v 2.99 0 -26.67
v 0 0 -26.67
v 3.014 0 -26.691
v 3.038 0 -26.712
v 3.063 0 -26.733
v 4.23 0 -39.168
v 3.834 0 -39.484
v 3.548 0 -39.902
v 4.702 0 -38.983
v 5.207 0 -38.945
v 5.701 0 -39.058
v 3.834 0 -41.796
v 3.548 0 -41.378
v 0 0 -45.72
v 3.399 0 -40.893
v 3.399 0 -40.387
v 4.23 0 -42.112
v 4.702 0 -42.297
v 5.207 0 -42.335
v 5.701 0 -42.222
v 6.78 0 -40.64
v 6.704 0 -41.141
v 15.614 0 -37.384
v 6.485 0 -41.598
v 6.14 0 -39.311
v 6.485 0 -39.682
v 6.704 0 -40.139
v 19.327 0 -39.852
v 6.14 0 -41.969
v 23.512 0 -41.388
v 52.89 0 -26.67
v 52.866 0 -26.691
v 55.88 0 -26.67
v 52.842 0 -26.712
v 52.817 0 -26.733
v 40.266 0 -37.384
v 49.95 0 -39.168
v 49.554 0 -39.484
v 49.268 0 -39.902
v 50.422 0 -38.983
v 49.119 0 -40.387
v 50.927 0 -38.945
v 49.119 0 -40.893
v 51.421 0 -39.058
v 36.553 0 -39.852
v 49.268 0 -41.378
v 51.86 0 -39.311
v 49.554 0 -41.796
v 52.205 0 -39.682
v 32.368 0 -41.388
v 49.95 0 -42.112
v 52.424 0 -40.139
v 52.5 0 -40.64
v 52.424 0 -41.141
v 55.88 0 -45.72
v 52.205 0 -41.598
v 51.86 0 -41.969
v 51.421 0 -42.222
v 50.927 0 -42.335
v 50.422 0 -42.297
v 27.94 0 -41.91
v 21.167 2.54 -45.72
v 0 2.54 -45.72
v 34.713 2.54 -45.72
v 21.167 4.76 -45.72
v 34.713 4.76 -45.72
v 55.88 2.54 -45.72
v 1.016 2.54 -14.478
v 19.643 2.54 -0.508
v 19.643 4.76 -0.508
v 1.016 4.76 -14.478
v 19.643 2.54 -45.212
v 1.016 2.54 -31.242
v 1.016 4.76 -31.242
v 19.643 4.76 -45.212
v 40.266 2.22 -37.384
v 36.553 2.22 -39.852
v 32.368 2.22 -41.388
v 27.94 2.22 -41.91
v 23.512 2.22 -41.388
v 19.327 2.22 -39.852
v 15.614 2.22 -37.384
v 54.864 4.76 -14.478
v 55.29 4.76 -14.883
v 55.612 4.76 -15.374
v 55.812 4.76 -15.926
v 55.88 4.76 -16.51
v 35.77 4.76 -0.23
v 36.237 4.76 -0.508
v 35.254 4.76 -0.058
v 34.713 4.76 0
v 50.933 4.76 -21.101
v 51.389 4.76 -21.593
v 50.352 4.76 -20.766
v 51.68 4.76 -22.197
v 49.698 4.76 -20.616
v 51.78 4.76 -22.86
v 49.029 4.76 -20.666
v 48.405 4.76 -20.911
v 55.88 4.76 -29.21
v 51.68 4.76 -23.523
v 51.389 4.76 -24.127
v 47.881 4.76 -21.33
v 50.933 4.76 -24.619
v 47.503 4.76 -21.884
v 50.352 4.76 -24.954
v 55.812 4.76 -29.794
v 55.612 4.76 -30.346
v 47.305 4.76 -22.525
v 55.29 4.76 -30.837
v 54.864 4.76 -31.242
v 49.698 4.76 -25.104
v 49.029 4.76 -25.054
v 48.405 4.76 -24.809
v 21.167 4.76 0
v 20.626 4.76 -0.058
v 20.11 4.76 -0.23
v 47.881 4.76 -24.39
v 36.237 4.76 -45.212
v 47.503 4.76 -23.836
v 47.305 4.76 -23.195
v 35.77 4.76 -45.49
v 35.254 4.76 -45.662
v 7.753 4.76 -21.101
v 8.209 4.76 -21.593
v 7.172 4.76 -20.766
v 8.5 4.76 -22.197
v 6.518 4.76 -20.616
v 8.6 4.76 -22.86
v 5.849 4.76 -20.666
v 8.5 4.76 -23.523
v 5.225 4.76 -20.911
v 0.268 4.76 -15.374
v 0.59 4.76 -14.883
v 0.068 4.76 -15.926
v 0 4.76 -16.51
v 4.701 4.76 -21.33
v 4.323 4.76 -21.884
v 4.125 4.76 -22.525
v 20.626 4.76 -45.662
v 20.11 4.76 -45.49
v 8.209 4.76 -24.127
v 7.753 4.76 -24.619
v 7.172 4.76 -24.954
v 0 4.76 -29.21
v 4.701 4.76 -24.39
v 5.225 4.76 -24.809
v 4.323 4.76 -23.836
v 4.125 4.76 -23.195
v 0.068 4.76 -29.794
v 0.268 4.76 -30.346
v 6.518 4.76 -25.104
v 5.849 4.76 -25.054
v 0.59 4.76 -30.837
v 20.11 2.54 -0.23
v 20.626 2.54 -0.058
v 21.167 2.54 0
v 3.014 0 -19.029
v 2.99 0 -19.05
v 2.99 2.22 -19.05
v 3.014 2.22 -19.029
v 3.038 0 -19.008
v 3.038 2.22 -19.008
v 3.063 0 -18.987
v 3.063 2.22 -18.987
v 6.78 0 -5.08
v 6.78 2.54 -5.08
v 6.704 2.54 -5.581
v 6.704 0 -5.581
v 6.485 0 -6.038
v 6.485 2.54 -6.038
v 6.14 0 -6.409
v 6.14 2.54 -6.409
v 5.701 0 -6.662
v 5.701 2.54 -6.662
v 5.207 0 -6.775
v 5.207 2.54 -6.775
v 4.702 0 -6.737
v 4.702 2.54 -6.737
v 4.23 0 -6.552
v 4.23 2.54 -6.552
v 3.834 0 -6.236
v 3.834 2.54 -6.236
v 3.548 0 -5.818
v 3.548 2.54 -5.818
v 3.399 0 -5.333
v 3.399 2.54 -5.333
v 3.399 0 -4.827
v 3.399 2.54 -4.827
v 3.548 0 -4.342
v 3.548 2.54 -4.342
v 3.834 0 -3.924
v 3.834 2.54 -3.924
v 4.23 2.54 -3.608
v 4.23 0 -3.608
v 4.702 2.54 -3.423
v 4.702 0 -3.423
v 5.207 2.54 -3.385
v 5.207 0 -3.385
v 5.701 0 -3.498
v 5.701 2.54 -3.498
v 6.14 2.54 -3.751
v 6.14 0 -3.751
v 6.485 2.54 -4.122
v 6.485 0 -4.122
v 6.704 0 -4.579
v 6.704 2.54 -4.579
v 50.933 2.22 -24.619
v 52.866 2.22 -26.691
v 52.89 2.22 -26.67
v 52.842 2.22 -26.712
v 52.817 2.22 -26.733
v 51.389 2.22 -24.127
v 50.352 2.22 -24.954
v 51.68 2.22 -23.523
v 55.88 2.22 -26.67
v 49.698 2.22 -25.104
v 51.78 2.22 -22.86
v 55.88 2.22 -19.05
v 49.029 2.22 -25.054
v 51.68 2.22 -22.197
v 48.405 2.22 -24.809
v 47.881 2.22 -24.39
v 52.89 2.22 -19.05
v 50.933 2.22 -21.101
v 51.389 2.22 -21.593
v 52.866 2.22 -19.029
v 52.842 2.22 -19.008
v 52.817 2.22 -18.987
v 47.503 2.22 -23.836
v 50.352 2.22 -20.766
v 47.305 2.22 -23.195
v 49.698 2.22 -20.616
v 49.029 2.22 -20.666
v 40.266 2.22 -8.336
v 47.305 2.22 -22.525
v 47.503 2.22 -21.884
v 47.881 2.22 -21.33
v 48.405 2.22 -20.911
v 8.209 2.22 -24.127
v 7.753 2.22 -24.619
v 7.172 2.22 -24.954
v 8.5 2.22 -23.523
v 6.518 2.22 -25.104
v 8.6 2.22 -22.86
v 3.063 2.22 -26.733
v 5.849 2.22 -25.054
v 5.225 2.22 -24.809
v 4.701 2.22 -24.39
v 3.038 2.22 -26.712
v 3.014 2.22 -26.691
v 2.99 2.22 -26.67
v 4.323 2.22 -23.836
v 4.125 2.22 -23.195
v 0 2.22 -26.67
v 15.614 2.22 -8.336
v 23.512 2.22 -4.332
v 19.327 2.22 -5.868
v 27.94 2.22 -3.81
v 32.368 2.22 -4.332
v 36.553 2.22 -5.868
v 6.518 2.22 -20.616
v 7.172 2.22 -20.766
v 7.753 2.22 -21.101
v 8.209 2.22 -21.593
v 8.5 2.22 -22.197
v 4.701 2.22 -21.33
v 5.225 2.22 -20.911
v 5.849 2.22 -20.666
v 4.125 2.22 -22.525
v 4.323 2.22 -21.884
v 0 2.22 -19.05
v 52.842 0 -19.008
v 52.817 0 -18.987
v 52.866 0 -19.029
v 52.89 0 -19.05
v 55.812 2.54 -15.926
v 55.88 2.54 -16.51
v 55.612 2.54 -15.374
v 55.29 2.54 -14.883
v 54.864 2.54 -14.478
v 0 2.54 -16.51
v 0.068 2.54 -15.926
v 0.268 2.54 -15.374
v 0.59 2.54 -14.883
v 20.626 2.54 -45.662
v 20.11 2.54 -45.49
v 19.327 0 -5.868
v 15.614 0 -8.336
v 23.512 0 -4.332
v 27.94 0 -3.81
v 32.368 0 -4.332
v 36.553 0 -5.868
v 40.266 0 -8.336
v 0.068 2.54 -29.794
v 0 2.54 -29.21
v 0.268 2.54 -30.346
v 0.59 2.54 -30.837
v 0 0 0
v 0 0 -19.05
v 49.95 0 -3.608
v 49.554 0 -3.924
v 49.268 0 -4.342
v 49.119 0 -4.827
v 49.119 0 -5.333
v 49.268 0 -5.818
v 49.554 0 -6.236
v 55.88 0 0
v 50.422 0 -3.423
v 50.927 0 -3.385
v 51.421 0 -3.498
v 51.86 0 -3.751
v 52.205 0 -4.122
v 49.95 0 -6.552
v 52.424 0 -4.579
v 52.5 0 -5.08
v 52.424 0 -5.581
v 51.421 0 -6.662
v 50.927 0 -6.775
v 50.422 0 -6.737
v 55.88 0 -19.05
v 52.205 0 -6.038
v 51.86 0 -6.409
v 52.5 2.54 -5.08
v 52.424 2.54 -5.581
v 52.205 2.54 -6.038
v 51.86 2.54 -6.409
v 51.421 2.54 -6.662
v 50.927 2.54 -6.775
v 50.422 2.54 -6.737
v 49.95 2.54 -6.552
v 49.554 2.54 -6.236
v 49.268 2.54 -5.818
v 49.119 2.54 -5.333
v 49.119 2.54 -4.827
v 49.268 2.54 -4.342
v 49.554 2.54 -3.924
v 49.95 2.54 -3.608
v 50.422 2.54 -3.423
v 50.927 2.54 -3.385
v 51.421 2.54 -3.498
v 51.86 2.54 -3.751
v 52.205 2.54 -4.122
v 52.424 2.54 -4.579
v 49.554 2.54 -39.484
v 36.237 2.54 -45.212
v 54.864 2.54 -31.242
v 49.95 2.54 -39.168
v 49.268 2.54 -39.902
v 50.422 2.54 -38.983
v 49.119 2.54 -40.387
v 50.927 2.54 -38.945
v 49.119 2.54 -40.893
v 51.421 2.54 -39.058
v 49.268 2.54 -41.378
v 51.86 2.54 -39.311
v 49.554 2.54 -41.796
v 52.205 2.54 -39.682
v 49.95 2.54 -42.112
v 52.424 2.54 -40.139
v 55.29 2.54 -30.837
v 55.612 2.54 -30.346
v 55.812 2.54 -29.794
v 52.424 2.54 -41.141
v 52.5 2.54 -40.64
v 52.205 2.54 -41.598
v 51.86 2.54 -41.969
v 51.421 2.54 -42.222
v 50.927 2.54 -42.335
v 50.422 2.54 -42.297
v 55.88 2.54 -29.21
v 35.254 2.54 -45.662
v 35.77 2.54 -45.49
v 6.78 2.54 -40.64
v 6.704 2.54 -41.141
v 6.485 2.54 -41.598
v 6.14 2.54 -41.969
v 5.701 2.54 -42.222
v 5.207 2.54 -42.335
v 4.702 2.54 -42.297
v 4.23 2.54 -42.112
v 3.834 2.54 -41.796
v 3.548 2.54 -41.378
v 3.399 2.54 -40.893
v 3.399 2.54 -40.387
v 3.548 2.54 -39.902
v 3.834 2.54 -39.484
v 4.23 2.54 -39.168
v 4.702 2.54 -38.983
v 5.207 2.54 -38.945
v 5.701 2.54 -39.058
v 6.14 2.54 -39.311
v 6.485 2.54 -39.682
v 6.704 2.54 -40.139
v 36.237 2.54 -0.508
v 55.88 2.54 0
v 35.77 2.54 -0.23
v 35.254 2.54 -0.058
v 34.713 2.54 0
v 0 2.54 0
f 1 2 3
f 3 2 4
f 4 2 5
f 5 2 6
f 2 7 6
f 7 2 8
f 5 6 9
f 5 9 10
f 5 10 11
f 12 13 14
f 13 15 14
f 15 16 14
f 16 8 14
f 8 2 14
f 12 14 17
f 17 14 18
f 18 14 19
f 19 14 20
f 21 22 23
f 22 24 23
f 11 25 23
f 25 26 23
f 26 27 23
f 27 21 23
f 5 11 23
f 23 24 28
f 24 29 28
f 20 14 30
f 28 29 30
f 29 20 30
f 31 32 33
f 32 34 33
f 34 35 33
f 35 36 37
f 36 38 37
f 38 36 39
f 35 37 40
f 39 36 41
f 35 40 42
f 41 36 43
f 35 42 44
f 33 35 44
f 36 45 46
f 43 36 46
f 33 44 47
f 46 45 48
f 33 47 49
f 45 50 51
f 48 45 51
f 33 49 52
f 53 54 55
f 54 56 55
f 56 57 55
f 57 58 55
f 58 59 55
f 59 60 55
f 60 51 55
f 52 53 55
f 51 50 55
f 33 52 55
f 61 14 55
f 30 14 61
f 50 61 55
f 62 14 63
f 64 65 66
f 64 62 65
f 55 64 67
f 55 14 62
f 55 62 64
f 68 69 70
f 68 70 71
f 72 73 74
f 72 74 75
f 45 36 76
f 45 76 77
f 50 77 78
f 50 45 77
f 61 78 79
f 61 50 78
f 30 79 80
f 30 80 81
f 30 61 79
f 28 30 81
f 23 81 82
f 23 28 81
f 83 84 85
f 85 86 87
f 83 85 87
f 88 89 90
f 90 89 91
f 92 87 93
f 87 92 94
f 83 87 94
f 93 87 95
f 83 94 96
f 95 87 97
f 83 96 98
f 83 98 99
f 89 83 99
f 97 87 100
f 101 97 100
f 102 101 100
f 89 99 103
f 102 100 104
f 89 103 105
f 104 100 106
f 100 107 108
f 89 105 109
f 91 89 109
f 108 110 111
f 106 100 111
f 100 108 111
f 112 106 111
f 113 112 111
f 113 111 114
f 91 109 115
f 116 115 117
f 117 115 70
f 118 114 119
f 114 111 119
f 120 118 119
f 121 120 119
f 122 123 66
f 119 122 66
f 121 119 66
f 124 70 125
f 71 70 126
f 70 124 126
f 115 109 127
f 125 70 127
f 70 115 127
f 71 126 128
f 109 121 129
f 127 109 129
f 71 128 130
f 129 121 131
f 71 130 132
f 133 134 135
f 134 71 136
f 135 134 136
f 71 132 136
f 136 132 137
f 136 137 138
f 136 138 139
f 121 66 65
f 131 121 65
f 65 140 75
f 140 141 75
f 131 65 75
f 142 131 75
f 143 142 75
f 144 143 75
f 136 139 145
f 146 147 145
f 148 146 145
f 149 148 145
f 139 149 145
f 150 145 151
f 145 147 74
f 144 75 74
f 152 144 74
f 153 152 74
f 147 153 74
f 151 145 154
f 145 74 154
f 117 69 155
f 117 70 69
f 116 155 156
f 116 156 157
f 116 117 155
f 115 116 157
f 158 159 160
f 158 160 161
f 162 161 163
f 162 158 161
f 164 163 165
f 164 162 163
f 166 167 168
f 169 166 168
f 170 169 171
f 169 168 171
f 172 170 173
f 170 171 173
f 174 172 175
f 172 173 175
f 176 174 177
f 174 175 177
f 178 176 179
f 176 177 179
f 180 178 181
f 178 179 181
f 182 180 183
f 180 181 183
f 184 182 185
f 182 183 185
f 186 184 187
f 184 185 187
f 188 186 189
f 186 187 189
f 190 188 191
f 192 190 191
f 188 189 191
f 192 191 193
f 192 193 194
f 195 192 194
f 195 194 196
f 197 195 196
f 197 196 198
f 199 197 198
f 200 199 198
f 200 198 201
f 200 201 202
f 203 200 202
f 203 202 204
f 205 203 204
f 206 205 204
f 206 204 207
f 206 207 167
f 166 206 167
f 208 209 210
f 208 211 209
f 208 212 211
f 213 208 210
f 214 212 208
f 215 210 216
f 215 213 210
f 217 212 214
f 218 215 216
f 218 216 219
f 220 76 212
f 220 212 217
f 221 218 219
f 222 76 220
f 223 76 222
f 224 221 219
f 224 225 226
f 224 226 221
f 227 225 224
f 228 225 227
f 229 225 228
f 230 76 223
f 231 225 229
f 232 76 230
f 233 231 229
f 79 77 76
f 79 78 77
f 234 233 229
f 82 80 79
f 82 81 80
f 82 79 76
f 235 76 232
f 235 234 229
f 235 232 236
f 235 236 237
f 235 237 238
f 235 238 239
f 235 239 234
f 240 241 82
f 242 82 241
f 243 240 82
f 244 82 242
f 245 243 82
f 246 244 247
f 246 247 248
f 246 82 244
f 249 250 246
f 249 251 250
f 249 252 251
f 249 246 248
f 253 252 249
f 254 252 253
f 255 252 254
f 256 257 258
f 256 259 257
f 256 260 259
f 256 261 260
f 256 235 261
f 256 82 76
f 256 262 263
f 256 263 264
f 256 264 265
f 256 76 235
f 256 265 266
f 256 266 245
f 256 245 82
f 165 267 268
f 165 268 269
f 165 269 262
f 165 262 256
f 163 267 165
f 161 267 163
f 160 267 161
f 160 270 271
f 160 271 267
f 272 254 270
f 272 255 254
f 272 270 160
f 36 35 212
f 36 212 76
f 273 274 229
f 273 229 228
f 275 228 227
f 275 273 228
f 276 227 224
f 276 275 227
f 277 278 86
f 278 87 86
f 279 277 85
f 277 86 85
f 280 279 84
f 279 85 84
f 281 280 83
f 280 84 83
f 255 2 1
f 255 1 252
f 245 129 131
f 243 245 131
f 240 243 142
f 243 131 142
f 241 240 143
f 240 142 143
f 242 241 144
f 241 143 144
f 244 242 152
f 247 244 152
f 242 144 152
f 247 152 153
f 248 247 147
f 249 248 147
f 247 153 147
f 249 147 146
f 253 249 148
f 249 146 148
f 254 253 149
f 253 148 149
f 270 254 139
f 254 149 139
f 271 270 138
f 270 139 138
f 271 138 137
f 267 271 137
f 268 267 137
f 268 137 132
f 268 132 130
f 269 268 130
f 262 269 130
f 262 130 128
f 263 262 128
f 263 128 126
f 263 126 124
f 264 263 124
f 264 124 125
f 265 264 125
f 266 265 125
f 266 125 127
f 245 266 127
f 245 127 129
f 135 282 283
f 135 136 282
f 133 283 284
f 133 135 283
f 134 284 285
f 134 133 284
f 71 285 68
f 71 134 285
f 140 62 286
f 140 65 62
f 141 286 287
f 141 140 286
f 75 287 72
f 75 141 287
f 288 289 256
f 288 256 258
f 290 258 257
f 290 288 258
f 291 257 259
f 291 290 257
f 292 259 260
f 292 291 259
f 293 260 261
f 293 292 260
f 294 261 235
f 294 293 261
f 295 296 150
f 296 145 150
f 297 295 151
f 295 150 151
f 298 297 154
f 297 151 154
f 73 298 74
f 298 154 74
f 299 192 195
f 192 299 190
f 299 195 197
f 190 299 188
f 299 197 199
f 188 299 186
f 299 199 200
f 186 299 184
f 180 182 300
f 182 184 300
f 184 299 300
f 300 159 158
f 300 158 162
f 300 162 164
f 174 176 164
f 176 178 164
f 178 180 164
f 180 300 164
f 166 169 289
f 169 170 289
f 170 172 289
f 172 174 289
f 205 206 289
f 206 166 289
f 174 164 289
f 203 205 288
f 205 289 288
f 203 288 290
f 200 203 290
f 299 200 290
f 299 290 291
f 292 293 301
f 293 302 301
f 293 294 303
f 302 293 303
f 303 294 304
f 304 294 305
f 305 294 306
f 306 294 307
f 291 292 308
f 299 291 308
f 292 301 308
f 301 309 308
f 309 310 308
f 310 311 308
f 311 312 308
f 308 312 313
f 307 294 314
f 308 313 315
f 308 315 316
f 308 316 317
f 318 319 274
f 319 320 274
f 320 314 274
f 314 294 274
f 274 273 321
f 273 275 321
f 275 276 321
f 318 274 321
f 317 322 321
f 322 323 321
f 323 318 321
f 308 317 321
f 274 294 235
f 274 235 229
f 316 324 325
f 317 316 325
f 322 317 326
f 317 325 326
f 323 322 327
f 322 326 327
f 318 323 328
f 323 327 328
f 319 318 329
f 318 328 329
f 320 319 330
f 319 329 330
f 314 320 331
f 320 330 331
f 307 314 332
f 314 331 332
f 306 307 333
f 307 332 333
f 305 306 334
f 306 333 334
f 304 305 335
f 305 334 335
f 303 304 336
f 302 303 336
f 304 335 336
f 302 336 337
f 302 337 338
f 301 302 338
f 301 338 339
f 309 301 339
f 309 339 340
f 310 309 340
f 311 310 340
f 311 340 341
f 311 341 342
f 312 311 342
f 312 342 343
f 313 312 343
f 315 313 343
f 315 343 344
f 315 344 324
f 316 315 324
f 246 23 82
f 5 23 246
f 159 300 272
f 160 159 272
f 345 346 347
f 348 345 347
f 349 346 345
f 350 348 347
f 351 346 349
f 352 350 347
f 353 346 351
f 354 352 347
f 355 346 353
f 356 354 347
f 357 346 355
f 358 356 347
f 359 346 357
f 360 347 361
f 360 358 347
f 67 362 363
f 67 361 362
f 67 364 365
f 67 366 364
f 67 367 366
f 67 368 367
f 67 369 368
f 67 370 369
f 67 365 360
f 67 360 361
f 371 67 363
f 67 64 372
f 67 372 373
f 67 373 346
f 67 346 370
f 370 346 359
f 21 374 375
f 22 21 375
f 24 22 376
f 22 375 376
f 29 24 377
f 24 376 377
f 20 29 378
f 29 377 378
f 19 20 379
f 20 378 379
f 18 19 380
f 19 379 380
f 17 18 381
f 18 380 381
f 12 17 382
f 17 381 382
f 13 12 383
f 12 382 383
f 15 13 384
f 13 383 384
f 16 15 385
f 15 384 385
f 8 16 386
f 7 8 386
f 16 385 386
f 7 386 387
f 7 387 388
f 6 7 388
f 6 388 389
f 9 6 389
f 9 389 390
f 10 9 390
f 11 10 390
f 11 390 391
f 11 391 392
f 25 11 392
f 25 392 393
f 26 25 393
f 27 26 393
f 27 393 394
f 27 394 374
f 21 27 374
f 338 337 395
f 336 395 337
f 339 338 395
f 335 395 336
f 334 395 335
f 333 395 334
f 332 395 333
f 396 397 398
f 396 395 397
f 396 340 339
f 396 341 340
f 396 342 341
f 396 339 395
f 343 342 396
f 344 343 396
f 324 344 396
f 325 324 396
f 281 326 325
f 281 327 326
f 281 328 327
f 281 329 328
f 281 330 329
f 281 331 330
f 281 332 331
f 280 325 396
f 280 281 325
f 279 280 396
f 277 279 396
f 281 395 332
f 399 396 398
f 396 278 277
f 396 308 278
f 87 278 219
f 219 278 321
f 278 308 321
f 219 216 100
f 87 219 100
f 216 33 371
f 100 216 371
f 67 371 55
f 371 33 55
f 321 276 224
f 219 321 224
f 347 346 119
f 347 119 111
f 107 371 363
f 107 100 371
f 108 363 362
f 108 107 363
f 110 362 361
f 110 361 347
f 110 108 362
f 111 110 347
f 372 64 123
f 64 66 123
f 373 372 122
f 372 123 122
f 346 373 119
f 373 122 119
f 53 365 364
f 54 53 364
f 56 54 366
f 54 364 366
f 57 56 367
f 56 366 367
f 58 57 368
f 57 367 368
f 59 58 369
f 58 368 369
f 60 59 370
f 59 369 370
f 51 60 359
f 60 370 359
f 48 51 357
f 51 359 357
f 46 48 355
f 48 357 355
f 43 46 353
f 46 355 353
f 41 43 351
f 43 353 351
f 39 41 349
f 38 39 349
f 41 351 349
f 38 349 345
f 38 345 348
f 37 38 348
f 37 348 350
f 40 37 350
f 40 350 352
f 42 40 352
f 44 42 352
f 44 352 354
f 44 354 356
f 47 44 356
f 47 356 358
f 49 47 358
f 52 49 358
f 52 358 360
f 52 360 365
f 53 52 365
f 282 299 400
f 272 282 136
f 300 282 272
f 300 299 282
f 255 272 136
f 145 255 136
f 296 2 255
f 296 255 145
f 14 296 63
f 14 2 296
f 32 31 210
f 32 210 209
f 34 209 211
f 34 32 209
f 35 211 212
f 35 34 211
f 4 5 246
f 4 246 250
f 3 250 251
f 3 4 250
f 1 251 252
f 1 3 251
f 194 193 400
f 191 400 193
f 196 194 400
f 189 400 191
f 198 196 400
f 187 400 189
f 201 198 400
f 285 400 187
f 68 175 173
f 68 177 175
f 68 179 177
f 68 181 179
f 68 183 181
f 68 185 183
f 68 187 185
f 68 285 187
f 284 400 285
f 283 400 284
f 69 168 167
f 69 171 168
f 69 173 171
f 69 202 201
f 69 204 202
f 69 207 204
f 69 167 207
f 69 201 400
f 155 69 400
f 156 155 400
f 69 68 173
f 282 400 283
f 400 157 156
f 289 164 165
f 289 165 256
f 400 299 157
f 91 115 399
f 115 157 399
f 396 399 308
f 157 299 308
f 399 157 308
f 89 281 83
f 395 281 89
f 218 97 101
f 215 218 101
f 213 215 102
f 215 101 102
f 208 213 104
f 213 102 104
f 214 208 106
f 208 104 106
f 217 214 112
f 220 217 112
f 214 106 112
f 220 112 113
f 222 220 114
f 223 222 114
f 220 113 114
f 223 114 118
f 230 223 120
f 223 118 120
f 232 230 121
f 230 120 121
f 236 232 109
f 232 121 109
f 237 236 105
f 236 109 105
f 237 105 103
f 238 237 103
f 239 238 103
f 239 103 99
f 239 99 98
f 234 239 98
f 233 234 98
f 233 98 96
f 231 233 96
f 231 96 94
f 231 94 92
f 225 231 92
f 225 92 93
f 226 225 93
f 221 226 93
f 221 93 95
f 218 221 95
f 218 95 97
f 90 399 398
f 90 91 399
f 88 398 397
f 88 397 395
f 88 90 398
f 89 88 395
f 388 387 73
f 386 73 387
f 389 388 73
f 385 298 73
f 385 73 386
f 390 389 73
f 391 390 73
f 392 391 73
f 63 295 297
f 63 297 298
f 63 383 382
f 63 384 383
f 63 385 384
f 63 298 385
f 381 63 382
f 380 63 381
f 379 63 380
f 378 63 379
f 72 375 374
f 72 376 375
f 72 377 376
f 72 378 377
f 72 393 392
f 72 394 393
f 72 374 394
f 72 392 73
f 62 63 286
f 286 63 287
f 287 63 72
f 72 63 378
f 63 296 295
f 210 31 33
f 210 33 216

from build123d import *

# Parameters (mm, degrees)
SKETCH1_W           = 55.88
SKETCH1_H           = 45.72
BOSS_EXTRUDE1_DEPTH = 2.54
CUT_EXTRUDE1_REACH  = 4.54
SKETCH2_R           = 1.7
BOSS_EXTRUDE2_DEPTH = 2.21996
CUT_EXTRUDE2_DEPTH  = 2.21996
CUT_EXTRUDE3_REACH  = 6.76
SKETCH6_R           = 2.25
SKETCH7_W           = 7.62
SKETCH7_H           = 2.21996
CUT_EXTRUDE4_DEPTH  = 56.88
FILLET1_R           = 2.54


with BuildPart() as part:
    # Sketch1 → Boss-Extrude1 (new body)
    with BuildSketch(Plane(origin=(0, 0, 0), x_dir=(1, 0, 0), z_dir=(0, 1, 0))):
        with Locations((27.94, 22.86)):
            Rectangle(SKETCH1_W, SKETCH1_H)
    extrude(amount=BOSS_EXTRUDE1_DEPTH)

    # Sketch2 → Cut-Extrude1 (cut, up to next)
    with BuildSketch(Plane(origin=(0, 2.54, 0), x_dir=(1, 0, 0), z_dir=(0, 1, 0)), mode=Mode.PRIVATE) as cut_extrude1_sk1:
        with Locations((5.08, 40.64)):
            Circle(SKETCH2_R)
    cut_extrude1_tool1 = extrude(cut_extrude1_sk1.sketch, amount=-CUT_EXTRUDE1_REACH, mode=Mode.PRIVATE) & part.part
    add(cut_extrude1_tool1.solids().sort_by_distance((5.08, 2.54, -40.64))[0], mode=Mode.SUBTRACT)
    # Sketch2 → Cut-Extrude1 (cut, up to next)
    with BuildSketch(Plane(origin=(0, 2.54, 0), x_dir=(1, 0, 0), z_dir=(0, 1, 0)), mode=Mode.PRIVATE) as cut_extrude1_sk2:
        with Locations((50.8, 40.64)):
            Circle(SKETCH2_R)
    cut_extrude1_tool2 = extrude(cut_extrude1_sk2.sketch, amount=-CUT_EXTRUDE1_REACH, mode=Mode.PRIVATE) & part.part
    add(cut_extrude1_tool2.solids().sort_by_distance((50.8, 2.54, -40.64))[0], mode=Mode.SUBTRACT)
    # Sketch2 → Cut-Extrude1 (cut, up to next)
    with BuildSketch(Plane(origin=(0, 2.54, 0), x_dir=(1, 0, 0), z_dir=(0, 1, 0)), mode=Mode.PRIVATE) as cut_extrude1_sk3:
        with Locations((50.8, 5.08)):
            Circle(SKETCH2_R)
    cut_extrude1_tool3 = extrude(cut_extrude1_sk3.sketch, amount=-CUT_EXTRUDE1_REACH, mode=Mode.PRIVATE) & part.part
    add(cut_extrude1_tool3.solids().sort_by_distance((50.8, 2.54, -5.08))[0], mode=Mode.SUBTRACT)
    # Sketch2 → Cut-Extrude1 (cut, up to next)
    with BuildSketch(Plane(origin=(0, 2.54, 0), x_dir=(1, 0, 0), z_dir=(0, 1, 0)), mode=Mode.PRIVATE) as cut_extrude1_sk4:
        with Locations((5.08, 5.08)):
            Circle(SKETCH2_R)
    cut_extrude1_tool4 = extrude(cut_extrude1_sk4.sketch, amount=-CUT_EXTRUDE1_REACH, mode=Mode.PRIVATE) & part.part
    add(cut_extrude1_tool4.solids().sort_by_distance((5.08, 2.54, -5.08))[0], mode=Mode.SUBTRACT)

    # Sketch4 → Boss-Extrude2 (add)
    with BuildSketch(Plane(origin=(0, 2.54, 0), x_dir=(1, 0, 0), z_dir=(0, 1, 0))):
        Polygon((0, 30.48), (20.32, 45.72), (35.56, 45.72), (55.88, 30.48), (55.88, 15.24), (35.56, 0), (20.32, 0), (0, 15.24), align=None)
    extrude(amount=BOSS_EXTRUDE2_DEPTH)

    # Sketch5 → Cut-Extrude2 (cut)
    with BuildSketch(Plane.XZ):
        with BuildLine():
            Line((3.062941176, -18.986804383), (15.613529412, -8.335516435))
            ThreePointArc((15.613529412, -8.335516435), (27.94, -3.81), (40.266470588, -8.335516435))
            Line((40.266470588, -8.335516435), (52.817058824, -18.986804383))
            ThreePointArc((52.817058824, -18.986804383), (54.61, -22.86), (52.817058824, -26.733195617))
            Line((52.817058824, -26.733195617), (40.266470588, -37.384483565))
            ThreePointArc((40.266470588, -37.384483565), (27.94, -41.91), (15.613529412, -37.384483565))
            Line((15.613529412, -37.384483565), (3.062941176, -26.733195617))
            ThreePointArc((3.062941176, -26.733195617), (1.27, -22.86), (3.062941176, -18.986804383))
        make_face()
    extrude(amount=-CUT_EXTRUDE2_DEPTH, mode=Mode.SUBTRACT)

    # Sketch6 → Cut-Extrude3 (cut, up to next)
    with BuildSketch(Plane(origin=(0, 4.75996, 0), x_dir=(1, 0, 0), z_dir=(0, 1, 0)), mode=Mode.PRIVATE) as cut_extrude3_sk1:
        with Locations((6.35, 22.86)):
            Circle(SKETCH6_R)
    cut_extrude3_tool1 = extrude(cut_extrude3_sk1.sketch, amount=-CUT_EXTRUDE3_REACH, mode=Mode.PRIVATE) & part.part
    add(cut_extrude3_tool1.solids().sort_by_distance((6.35, 4.75996, -22.86))[0], mode=Mode.SUBTRACT)
    # Sketch6 → Cut-Extrude3 (cut, up to next)
    with BuildSketch(Plane(origin=(0, 4.75996, 0), x_dir=(1, 0, 0), z_dir=(0, 1, 0)), mode=Mode.PRIVATE) as cut_extrude3_sk2:
        with Locations((49.53, 22.86)):
            Circle(SKETCH6_R)
    cut_extrude3_tool2 = extrude(cut_extrude3_sk2.sketch, amount=-CUT_EXTRUDE3_REACH, mode=Mode.PRIVATE) & part.part
    add(cut_extrude3_tool2.solids().sort_by_distance((49.53, 4.75996, -22.86))[0], mode=Mode.SUBTRACT)

    # Sketch7 → Cut-Extrude4 (cut, through all)
    with BuildSketch(Plane.ZY):
        with Locations((-22.86, 1.10998)):
            Rectangle(SKETCH7_W, SKETCH7_H)
    extrude(amount=-CUT_EXTRUDE4_DEPTH, mode=Mode.SUBTRACT)

    # Fillet1
    fillet1_edges = [part.edges().sort_by_distance(p)[0] for p in [
        (0, 3.64998, -30.48),
        (0, 3.64998, -15.24),
        (20.32, 3.64998, 0),
        (35.56, 3.64998, 0),
        (55.88, 3.64998, -15.24),
        (55.88, 3.64998, -30.48),
        (35.56, 3.64998, -45.72),
        (20.32, 3.64998, -45.72),
    ]]
    fillet(fillet1_edges, radius=FILLET1_R)


solid = part.part
